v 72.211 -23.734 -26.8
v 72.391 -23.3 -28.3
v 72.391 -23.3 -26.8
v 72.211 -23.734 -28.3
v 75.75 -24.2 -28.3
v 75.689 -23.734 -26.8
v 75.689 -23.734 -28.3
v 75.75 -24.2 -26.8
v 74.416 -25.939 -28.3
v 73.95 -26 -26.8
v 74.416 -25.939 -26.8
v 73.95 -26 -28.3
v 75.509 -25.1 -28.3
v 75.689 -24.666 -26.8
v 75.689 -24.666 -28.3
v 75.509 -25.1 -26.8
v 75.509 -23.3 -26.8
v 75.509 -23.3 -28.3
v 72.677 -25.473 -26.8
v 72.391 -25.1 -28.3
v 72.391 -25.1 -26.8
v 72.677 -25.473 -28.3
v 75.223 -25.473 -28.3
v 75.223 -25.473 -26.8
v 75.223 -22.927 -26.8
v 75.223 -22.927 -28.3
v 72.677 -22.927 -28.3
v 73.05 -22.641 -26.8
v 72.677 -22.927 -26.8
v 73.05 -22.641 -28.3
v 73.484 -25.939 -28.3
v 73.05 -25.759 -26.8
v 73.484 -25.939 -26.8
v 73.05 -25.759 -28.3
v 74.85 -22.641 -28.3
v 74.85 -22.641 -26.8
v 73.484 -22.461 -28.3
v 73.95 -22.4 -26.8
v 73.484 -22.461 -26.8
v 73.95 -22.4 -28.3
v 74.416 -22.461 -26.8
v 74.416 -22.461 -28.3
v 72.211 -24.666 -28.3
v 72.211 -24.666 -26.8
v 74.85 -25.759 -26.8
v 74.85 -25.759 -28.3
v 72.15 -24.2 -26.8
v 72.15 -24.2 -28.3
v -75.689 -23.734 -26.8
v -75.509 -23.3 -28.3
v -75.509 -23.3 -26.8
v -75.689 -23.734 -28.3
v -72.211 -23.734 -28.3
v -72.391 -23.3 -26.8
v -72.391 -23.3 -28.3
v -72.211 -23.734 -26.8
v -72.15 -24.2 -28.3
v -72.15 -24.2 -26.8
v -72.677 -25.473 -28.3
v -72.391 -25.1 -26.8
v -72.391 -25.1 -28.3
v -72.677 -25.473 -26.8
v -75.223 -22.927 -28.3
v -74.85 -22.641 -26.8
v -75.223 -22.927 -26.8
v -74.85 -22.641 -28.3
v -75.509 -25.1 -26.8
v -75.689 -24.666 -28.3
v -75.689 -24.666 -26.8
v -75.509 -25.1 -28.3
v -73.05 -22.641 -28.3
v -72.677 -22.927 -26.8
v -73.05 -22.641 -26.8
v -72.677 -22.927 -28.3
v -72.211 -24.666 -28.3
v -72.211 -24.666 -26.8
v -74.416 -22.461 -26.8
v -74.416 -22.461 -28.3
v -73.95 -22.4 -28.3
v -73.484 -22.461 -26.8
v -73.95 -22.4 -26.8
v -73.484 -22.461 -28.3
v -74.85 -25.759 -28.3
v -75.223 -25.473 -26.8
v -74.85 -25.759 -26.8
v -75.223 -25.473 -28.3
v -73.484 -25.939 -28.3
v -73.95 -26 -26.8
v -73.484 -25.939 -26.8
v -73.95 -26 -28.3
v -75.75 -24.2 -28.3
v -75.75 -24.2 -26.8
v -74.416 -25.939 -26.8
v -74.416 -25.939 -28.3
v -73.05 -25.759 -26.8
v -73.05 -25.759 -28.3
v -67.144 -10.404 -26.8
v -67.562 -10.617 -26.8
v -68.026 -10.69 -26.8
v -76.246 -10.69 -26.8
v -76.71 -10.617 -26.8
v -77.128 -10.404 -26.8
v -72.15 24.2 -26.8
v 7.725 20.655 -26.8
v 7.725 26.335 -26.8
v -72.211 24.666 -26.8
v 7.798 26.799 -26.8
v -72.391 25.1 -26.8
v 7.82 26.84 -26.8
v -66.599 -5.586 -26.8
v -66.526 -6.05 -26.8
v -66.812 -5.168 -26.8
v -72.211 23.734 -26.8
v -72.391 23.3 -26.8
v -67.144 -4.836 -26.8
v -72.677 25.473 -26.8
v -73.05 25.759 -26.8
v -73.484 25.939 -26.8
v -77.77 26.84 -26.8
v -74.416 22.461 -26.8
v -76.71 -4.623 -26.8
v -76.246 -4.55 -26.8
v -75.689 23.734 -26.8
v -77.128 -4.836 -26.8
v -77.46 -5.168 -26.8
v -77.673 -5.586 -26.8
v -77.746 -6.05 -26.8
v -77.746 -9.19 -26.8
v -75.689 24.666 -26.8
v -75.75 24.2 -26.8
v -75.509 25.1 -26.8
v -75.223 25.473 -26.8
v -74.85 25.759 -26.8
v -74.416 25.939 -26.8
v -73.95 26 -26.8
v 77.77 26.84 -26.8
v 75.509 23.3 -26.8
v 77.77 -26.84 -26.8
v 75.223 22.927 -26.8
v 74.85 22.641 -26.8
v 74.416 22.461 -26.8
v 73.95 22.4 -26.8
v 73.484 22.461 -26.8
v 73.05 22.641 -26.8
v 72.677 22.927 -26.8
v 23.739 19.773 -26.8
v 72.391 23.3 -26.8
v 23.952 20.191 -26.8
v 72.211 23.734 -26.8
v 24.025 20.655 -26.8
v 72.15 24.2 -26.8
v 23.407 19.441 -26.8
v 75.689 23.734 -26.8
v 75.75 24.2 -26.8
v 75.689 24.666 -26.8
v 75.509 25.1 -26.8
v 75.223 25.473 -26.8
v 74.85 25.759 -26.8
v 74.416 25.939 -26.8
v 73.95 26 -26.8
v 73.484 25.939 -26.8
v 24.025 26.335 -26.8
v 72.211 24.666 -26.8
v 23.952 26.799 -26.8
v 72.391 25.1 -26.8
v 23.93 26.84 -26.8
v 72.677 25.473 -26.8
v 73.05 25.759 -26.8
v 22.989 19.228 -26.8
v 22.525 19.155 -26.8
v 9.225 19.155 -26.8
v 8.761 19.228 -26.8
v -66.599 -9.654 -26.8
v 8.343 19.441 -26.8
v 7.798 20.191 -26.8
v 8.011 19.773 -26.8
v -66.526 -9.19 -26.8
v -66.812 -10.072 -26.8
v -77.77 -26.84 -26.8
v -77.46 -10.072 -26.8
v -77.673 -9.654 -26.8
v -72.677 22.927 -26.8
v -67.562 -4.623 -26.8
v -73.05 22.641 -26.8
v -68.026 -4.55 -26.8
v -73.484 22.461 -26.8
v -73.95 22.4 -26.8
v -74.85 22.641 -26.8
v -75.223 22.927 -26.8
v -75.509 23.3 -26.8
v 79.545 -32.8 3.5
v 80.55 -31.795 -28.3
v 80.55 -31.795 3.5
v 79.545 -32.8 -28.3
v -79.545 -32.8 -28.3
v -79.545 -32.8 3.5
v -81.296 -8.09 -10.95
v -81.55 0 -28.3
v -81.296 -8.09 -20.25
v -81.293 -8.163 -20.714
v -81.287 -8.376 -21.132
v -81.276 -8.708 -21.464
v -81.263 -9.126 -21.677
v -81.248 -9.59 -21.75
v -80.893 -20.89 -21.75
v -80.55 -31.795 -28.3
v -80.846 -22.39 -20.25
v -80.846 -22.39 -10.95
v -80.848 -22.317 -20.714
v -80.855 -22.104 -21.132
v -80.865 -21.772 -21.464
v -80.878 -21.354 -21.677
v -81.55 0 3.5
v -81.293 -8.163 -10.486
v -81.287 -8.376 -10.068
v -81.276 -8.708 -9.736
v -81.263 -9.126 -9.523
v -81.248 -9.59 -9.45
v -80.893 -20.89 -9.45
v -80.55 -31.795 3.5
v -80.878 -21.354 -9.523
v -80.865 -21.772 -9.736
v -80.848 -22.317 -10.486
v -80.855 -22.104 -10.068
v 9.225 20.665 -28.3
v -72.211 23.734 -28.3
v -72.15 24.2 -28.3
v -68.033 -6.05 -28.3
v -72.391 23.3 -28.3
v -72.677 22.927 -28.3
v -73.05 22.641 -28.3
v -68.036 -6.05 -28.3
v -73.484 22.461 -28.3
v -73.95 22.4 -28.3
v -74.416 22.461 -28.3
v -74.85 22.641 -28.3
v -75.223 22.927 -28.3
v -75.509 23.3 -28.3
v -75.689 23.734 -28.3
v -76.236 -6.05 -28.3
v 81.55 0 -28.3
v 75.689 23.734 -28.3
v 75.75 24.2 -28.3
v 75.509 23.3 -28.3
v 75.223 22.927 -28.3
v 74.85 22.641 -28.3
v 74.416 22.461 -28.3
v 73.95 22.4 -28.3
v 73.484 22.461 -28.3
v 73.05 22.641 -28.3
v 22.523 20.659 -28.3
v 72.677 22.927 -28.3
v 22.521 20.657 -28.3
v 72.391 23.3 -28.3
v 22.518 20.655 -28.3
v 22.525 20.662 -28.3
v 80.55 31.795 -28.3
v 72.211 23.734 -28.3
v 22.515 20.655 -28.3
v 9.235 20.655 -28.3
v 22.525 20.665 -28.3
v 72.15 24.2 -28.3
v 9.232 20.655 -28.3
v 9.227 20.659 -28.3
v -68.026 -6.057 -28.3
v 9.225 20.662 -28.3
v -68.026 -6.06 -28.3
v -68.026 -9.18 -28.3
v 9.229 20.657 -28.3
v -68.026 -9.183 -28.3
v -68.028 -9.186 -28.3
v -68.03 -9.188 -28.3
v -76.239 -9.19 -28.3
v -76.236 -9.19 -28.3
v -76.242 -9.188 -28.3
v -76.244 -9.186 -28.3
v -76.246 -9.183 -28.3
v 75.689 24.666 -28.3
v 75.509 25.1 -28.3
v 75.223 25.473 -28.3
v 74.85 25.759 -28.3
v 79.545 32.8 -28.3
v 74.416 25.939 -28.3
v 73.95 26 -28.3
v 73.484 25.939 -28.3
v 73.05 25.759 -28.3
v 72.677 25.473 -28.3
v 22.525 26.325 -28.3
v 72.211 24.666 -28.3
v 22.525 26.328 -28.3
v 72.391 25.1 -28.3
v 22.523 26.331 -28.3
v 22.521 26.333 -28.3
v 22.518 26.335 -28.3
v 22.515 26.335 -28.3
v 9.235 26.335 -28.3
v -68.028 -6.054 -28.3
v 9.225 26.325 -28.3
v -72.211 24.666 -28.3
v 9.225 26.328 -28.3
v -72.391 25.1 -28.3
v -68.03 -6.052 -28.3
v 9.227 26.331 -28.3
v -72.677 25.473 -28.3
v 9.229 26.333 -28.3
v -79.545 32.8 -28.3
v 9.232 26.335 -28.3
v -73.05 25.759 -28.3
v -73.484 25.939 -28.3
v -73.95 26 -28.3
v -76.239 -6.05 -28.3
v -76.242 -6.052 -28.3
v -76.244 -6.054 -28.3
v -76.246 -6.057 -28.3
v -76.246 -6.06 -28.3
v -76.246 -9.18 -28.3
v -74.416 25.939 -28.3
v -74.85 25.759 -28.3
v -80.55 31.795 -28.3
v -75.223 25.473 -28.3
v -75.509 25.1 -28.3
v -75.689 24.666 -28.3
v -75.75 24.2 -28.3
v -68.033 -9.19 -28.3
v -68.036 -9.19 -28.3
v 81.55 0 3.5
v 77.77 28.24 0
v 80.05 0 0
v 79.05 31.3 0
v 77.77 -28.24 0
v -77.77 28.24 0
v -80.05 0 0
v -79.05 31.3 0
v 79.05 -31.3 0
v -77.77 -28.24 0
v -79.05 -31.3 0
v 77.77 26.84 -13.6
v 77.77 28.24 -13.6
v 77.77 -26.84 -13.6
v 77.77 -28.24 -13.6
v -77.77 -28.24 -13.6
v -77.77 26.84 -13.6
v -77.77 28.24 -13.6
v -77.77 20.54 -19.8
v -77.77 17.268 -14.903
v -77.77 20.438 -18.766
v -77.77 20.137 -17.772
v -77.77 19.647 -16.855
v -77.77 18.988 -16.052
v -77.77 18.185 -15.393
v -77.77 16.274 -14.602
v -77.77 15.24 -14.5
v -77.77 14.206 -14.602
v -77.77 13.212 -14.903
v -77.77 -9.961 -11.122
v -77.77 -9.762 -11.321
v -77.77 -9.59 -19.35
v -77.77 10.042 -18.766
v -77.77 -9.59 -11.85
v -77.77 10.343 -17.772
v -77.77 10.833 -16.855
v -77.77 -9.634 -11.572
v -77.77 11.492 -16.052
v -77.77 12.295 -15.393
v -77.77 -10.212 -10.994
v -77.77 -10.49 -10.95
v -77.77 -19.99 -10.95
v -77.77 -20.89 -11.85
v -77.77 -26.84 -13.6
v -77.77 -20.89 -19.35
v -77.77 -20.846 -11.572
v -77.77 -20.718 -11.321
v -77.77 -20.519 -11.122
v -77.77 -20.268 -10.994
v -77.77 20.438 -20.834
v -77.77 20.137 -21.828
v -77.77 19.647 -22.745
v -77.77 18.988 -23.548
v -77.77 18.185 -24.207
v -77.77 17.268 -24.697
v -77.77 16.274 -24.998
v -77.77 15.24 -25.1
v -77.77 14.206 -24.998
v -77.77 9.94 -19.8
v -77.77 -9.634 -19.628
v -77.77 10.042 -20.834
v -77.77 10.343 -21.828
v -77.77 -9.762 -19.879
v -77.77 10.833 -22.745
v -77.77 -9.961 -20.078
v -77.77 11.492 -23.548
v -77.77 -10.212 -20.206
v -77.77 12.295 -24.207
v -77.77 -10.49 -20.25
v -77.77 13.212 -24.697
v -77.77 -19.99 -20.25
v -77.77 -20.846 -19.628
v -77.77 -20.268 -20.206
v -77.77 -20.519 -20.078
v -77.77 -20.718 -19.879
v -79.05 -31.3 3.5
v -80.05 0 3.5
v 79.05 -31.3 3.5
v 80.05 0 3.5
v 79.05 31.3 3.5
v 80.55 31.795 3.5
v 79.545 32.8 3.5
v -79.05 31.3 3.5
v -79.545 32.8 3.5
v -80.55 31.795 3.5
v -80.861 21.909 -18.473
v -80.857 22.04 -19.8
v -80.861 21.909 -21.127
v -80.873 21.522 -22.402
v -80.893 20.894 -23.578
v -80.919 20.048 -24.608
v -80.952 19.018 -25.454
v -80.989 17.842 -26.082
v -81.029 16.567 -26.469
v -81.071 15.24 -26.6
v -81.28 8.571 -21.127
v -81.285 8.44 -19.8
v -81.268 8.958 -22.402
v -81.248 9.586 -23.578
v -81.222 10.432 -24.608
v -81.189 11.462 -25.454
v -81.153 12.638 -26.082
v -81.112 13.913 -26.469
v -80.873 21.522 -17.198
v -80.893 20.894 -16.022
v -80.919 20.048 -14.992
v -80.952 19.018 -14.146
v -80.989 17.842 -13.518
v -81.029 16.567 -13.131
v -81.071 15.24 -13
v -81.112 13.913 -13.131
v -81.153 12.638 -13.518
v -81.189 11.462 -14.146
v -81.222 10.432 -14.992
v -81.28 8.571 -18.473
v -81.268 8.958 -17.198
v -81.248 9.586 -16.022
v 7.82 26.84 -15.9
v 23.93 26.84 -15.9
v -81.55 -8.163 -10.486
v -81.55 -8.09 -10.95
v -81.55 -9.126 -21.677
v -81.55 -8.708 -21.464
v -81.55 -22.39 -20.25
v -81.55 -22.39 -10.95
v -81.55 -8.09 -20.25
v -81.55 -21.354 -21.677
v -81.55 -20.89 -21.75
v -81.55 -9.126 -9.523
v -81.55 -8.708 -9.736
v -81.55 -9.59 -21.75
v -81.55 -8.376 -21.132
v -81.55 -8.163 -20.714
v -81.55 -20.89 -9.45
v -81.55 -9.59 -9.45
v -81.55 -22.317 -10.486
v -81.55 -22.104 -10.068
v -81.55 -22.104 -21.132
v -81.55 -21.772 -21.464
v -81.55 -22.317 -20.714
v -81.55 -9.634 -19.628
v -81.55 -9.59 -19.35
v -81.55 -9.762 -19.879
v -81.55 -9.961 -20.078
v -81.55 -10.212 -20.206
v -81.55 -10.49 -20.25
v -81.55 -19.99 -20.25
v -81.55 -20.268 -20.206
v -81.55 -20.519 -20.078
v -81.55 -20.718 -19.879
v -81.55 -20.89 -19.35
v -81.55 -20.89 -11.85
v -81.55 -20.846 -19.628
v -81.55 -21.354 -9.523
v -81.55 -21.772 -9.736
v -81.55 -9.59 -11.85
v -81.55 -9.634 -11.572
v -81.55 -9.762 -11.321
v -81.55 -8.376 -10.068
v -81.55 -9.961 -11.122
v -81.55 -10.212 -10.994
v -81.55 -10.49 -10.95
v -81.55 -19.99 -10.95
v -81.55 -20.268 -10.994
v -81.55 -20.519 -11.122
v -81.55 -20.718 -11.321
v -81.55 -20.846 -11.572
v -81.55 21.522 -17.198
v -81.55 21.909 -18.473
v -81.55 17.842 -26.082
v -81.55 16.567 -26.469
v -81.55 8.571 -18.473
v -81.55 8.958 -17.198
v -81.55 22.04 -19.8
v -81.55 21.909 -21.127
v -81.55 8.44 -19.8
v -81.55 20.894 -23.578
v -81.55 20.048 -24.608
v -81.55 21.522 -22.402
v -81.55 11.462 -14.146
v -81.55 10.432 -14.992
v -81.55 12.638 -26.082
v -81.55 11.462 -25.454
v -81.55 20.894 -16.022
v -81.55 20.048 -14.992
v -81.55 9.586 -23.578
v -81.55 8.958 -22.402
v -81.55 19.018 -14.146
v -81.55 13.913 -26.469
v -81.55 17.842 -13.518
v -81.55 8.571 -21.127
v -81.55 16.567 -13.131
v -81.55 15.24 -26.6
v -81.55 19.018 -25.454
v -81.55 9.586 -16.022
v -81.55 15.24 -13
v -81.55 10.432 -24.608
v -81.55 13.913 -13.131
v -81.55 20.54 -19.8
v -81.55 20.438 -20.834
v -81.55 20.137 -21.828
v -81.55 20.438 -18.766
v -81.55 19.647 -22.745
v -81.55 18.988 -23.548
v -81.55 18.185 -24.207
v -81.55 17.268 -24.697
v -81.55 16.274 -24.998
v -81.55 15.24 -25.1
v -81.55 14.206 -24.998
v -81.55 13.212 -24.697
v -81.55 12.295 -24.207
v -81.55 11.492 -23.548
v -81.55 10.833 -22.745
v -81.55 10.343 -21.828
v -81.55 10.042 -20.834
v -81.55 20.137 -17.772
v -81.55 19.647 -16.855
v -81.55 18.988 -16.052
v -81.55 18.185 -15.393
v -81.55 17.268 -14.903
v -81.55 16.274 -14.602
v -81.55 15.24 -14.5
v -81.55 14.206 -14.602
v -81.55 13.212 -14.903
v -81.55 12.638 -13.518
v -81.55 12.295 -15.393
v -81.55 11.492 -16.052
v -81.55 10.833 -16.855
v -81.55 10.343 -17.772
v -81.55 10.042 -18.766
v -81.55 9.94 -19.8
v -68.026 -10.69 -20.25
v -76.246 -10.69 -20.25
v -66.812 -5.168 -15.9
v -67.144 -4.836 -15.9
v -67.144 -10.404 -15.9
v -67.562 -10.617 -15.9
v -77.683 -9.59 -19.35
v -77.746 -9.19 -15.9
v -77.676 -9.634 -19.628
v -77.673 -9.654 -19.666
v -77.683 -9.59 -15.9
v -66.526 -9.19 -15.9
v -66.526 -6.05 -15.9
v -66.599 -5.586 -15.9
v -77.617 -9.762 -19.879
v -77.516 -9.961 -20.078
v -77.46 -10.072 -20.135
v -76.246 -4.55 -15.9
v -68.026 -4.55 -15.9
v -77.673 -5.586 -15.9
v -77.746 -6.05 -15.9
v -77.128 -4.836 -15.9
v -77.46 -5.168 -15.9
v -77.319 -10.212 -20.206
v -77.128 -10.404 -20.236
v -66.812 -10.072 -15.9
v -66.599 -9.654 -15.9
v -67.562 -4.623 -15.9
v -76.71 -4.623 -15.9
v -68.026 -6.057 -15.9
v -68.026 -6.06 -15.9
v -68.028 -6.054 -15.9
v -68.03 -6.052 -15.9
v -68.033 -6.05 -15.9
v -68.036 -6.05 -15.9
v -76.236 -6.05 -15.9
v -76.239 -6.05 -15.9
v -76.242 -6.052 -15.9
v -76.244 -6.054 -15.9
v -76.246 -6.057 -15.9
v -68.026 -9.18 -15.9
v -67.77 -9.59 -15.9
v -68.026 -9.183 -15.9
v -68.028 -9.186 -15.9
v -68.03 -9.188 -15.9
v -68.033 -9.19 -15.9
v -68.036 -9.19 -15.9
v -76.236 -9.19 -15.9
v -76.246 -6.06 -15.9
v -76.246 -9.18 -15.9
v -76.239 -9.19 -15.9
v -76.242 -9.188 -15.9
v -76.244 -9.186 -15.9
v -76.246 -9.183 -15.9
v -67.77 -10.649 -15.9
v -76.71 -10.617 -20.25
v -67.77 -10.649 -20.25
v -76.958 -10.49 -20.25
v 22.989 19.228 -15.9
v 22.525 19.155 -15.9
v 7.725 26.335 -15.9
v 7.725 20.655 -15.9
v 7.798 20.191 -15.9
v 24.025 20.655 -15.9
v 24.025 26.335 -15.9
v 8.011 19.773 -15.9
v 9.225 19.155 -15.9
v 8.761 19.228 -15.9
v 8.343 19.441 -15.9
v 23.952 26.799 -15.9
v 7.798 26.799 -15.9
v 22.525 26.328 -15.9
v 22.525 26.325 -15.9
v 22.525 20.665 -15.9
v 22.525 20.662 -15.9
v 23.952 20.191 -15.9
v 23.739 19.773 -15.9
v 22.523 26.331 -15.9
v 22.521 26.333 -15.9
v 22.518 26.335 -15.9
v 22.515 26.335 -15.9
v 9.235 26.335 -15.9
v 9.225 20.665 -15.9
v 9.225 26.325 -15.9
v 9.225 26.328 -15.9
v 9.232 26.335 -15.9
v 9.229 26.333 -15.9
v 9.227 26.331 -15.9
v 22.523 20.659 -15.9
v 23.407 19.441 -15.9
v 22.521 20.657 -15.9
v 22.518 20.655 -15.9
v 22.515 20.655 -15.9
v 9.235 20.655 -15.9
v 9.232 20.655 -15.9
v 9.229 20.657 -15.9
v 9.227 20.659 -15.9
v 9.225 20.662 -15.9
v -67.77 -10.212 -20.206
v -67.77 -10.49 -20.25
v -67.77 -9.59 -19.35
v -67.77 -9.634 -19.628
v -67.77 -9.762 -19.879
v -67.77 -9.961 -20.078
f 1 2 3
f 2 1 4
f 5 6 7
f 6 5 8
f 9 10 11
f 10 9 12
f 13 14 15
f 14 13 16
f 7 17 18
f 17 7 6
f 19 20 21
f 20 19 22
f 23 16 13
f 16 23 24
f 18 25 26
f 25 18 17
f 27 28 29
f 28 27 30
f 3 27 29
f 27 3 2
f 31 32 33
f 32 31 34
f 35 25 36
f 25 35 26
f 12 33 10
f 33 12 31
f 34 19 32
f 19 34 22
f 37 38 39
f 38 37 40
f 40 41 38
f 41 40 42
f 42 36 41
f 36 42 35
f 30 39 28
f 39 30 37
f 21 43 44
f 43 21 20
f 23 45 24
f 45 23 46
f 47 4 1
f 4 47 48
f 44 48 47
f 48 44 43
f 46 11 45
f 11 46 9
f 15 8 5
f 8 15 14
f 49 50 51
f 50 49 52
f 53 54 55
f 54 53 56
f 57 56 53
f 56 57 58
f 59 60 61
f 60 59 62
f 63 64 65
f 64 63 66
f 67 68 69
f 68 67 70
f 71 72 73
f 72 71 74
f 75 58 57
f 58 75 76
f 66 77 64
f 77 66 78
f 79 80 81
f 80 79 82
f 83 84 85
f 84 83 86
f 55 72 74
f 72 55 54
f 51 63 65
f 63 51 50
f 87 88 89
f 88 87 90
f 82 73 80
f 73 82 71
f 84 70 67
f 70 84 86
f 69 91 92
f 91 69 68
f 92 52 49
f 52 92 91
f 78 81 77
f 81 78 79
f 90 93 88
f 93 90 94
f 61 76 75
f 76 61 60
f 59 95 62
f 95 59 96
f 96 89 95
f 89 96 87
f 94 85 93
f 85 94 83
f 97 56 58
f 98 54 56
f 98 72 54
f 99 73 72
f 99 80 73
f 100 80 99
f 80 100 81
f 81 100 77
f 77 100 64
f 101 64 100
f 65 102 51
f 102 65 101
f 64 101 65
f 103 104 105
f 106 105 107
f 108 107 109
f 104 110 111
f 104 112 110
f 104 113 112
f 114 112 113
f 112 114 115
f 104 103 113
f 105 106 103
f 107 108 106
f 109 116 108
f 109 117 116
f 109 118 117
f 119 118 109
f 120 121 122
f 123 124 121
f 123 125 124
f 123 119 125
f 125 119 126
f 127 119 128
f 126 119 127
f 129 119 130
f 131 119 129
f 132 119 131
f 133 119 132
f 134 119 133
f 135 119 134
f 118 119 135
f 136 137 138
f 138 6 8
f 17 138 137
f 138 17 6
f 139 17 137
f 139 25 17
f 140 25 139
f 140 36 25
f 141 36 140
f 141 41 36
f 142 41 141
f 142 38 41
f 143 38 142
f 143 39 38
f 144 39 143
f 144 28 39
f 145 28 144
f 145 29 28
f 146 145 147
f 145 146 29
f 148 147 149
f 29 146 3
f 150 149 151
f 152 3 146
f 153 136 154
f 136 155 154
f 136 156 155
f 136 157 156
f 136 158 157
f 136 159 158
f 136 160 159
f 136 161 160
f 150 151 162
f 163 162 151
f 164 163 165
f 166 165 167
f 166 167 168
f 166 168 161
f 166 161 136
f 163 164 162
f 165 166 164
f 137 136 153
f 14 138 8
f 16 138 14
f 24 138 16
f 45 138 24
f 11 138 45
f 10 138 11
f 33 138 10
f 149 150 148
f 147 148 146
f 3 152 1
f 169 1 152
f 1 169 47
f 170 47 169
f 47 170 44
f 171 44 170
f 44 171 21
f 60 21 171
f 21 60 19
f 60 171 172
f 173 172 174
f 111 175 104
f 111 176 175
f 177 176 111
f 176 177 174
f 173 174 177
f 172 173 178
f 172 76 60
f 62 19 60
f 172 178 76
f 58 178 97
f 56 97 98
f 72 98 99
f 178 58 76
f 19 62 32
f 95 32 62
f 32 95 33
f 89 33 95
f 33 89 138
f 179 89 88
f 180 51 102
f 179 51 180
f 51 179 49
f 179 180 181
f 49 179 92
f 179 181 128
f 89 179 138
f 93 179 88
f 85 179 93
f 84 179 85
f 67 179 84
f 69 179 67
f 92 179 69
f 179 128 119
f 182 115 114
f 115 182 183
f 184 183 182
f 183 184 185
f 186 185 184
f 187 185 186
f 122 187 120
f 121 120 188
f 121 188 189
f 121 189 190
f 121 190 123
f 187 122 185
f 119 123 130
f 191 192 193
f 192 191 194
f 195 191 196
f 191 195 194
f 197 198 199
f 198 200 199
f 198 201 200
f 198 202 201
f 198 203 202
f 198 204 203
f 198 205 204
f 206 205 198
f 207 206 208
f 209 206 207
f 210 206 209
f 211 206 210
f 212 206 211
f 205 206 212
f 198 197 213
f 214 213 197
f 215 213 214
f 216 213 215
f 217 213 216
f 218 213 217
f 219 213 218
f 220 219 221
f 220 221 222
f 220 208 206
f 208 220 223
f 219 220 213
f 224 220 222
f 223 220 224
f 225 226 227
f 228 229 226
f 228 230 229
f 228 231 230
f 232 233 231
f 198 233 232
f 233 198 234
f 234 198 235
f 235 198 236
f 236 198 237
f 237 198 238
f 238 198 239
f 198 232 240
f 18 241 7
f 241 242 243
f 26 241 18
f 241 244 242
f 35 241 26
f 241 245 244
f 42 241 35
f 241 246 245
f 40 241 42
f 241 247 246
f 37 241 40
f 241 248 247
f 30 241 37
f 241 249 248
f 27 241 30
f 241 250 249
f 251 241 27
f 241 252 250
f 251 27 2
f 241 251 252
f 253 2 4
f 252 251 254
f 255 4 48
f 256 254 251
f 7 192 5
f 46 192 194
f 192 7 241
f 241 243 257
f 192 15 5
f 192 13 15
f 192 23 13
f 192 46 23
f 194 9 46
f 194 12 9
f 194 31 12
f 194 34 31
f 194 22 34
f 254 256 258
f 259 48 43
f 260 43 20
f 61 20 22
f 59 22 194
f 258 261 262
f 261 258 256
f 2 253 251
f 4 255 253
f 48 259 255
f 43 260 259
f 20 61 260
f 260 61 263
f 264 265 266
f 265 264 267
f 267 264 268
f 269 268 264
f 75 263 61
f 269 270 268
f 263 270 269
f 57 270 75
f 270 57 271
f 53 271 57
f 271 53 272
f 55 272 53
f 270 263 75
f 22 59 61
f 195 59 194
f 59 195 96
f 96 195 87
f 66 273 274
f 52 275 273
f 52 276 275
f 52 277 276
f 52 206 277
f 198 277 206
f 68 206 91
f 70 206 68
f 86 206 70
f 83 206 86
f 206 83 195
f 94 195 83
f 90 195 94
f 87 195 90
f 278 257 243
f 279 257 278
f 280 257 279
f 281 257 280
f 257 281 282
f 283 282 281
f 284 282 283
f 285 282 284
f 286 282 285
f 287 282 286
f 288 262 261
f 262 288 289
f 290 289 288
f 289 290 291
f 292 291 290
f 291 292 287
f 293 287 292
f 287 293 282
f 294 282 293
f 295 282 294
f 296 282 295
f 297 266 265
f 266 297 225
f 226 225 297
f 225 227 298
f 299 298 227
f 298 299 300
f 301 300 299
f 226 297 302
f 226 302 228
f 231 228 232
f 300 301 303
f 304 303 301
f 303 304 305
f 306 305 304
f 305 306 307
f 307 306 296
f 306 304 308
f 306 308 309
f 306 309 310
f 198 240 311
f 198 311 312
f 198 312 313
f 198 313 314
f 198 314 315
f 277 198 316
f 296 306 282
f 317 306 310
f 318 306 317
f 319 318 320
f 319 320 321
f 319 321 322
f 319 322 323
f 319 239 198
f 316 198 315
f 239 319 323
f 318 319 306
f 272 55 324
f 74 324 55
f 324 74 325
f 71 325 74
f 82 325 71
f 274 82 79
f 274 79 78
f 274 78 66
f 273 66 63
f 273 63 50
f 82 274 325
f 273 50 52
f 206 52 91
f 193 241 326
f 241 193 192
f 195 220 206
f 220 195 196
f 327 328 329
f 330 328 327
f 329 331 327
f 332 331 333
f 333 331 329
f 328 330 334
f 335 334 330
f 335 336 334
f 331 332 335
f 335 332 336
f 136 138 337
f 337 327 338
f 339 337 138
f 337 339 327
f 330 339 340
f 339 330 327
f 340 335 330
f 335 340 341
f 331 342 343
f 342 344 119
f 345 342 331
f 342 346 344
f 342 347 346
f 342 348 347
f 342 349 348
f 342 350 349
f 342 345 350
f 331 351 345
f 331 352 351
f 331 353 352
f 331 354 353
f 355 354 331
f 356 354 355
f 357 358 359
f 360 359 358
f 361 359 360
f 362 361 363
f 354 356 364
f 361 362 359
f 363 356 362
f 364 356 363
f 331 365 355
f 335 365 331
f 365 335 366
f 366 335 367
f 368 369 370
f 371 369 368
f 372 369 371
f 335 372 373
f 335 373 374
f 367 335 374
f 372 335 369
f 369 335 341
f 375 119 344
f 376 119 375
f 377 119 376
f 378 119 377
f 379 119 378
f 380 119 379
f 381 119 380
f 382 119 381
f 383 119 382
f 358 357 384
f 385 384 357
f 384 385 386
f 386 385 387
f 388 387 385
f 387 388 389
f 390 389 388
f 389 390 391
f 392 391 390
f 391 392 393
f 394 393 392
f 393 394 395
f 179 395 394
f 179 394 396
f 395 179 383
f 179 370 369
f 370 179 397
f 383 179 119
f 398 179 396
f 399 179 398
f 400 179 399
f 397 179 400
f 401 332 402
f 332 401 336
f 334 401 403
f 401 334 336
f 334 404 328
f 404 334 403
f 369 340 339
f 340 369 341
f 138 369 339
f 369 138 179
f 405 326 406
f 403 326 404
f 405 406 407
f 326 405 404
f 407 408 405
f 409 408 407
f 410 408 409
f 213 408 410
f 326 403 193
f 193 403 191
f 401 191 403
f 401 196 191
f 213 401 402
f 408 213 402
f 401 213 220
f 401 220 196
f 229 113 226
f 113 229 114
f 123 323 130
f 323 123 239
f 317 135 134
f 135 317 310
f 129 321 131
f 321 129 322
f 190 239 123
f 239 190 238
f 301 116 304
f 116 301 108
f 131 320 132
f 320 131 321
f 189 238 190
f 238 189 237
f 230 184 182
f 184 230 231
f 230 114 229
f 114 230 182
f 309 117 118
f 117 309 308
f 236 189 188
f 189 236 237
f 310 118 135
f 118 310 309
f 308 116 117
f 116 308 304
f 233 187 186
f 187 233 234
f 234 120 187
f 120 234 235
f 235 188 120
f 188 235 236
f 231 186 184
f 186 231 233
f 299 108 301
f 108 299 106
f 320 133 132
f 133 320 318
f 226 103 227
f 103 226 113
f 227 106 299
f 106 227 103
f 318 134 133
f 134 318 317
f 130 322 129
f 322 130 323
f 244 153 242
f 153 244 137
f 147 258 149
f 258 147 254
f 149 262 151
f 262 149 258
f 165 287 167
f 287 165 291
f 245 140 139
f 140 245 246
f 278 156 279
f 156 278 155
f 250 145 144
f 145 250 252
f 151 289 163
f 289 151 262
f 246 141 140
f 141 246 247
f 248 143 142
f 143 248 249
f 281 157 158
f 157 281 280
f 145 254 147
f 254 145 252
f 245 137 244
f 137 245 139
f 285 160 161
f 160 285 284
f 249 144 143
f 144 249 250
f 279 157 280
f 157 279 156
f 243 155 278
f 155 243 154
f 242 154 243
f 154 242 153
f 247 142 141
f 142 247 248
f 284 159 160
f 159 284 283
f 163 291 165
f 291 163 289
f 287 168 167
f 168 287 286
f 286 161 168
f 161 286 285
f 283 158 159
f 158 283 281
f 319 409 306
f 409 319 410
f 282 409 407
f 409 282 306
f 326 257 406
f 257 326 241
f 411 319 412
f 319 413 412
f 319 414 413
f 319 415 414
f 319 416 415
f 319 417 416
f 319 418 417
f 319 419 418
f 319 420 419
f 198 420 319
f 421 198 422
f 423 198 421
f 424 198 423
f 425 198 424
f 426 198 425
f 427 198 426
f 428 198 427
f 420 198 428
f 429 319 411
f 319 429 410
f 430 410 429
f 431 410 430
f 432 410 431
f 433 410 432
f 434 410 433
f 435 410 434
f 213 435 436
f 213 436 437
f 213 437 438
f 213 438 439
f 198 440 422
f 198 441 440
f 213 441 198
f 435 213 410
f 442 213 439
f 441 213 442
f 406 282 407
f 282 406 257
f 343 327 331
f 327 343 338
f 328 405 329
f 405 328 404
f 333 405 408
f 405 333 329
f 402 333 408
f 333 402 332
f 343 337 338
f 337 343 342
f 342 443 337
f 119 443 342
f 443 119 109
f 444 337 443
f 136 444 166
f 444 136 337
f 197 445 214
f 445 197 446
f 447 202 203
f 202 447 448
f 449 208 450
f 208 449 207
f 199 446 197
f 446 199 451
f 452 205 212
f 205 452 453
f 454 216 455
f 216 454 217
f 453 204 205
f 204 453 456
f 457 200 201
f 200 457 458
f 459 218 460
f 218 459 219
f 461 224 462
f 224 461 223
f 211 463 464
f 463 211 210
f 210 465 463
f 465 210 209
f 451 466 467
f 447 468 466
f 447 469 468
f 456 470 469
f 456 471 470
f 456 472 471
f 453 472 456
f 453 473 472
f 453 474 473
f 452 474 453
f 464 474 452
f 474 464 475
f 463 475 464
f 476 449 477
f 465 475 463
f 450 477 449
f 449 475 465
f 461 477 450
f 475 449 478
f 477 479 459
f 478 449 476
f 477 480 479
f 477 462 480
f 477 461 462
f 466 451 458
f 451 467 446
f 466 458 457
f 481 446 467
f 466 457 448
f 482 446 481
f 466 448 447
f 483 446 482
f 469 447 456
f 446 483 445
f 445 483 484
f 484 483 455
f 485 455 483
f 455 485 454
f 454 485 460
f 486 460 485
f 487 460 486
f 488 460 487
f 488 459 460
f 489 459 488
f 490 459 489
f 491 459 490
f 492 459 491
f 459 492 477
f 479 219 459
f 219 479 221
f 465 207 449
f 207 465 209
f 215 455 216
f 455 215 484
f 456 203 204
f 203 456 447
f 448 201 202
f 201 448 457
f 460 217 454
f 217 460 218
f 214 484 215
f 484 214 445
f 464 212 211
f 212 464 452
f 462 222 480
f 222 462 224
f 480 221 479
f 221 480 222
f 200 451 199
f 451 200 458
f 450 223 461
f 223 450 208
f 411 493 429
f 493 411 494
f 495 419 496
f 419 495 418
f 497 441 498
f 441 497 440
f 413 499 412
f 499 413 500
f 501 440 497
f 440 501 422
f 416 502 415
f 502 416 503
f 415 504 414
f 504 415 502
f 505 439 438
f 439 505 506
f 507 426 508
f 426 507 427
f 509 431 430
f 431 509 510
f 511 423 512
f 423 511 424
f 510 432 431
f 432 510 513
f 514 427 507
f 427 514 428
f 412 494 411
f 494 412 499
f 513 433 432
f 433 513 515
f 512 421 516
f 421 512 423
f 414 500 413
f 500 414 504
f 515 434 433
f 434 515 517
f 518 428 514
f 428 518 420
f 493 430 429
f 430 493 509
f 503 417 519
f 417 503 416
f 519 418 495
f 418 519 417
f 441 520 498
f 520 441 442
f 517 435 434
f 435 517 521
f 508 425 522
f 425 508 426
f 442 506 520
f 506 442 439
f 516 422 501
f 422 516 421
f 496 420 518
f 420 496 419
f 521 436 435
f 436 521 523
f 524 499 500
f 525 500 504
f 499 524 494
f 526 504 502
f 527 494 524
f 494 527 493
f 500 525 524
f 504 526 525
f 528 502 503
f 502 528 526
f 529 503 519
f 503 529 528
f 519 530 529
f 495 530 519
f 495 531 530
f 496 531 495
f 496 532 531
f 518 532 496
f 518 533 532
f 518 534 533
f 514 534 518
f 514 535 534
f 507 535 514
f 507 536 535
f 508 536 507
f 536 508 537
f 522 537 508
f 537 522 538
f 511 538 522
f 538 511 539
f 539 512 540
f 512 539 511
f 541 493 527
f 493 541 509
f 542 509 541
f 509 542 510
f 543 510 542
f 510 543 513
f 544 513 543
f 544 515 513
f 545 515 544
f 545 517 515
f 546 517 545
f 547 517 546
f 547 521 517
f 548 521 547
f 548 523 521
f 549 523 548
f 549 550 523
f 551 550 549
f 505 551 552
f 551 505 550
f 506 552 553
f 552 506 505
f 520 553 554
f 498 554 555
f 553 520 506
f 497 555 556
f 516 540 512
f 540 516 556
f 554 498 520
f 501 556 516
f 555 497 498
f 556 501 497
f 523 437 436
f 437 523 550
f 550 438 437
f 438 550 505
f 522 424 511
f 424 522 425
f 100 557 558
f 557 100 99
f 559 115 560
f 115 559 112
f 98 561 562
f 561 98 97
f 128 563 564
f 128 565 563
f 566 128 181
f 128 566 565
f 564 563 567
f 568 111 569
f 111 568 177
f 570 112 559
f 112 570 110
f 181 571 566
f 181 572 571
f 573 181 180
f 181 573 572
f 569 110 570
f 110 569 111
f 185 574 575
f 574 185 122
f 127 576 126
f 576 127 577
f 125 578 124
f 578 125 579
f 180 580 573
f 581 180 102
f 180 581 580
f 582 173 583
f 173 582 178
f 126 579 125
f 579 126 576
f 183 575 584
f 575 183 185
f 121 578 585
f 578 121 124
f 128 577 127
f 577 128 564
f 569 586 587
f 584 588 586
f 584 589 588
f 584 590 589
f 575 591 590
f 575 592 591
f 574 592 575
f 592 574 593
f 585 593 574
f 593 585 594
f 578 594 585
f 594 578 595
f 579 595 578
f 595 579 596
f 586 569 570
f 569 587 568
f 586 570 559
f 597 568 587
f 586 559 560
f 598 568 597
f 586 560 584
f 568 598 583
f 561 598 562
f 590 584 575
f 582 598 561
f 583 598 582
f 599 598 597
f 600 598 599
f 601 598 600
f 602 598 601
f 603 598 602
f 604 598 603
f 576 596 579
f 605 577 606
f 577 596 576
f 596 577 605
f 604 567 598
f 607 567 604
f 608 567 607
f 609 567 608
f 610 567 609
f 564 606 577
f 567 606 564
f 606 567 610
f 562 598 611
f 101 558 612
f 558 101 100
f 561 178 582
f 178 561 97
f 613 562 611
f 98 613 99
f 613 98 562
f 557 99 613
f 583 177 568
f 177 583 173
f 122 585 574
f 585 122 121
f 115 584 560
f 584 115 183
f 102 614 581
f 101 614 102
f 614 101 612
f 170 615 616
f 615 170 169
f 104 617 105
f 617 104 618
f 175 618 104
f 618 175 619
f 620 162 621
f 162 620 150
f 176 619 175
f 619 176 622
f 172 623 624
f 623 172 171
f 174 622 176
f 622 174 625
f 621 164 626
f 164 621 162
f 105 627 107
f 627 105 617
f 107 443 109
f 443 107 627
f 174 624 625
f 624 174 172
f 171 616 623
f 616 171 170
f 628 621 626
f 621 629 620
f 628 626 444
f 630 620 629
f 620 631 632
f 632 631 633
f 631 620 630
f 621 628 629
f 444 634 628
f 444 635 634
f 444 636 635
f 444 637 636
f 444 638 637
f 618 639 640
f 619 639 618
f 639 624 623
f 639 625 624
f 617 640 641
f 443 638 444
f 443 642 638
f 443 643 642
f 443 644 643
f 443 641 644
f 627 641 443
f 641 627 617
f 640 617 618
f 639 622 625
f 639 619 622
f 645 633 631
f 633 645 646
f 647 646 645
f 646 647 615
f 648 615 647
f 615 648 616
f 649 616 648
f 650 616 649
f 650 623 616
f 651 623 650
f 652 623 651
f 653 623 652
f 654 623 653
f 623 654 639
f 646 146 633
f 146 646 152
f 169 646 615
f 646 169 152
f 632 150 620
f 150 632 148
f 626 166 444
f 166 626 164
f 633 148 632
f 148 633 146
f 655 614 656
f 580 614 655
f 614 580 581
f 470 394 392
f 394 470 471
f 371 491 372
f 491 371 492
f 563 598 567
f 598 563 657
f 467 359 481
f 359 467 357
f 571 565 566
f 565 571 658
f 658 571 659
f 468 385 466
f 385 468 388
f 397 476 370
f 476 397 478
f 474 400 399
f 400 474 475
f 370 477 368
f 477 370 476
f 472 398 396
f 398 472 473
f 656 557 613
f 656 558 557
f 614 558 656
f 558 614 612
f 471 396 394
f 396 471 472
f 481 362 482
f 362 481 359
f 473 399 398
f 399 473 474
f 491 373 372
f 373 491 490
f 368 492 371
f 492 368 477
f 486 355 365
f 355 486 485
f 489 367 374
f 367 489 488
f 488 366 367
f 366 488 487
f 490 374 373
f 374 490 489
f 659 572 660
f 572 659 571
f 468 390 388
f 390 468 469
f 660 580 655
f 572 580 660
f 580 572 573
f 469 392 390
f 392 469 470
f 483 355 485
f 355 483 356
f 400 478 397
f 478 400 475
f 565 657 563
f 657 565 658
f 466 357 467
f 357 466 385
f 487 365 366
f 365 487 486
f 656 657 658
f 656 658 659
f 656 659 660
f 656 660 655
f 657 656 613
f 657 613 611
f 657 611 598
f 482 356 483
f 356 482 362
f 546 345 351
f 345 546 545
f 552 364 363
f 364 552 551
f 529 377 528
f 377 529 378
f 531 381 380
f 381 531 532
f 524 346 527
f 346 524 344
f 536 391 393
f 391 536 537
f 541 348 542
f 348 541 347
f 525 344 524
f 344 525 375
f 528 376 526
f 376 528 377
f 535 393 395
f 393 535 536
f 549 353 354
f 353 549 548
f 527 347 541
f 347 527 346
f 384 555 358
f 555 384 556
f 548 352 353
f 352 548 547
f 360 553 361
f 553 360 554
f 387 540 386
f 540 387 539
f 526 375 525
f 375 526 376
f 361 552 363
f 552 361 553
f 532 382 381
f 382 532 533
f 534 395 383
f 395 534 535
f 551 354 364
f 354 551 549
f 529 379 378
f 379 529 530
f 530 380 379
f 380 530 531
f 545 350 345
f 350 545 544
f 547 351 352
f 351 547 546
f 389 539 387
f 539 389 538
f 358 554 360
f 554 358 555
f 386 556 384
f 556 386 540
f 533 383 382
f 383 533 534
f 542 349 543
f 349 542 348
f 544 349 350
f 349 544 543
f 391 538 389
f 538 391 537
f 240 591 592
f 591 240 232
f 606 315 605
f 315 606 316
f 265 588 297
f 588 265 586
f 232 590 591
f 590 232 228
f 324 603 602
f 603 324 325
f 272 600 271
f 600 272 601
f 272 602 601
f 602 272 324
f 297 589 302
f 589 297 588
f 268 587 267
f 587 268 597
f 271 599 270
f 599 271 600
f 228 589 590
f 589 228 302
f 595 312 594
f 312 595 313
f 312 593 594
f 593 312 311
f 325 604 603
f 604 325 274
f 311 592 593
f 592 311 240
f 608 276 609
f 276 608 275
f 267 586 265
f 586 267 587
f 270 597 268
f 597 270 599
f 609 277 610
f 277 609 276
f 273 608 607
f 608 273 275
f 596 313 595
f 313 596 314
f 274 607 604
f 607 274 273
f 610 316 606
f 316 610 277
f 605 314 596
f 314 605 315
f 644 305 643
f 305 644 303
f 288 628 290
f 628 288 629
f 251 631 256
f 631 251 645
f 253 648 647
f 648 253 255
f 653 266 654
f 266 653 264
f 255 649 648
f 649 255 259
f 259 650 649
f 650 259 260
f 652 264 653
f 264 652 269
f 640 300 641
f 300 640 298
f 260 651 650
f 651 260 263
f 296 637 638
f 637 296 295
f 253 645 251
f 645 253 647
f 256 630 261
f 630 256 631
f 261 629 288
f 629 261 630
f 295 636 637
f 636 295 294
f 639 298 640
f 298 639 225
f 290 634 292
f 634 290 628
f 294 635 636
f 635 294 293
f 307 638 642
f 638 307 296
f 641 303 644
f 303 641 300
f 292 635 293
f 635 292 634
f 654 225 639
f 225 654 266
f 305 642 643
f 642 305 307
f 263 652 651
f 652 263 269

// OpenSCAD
// case for FG085 signal generator
//
// design origin is center inside of front panel

part = "shell";  // [ shell, demo ]
with_tubes = 0; // [ 1:true, 0:false ]
with_u5p = 0; // [ 1:true, 0:false ]
with_u6p = 1; // [ 1:true, 0:false ]
with_pwm = 1; // [ 1:true, 0:false ]
with_usb = 1; // [ 1:true, 0:false ]

/* [Hidden] */
function in2mm(a) = a * 25.4;

panel_width = 157.5; // at base BUG: accurate?
panel_height = 62.0; 
panel_wall = 2.0;
panel_delta_w = 1.0; // extra width at middle of sides
pcb_thickness = 1.6;
pcb_width = in2mm(6.100); 
pcb_height = in2mm(2.200); 
spacer_front = 12.0; // the spacer with the threads, placed behind front panel and pcb
spacer_rear = 13.2; // placed on rear of pcb
panel_dist = spacer_front + pcb_thickness + spacer_rear; // between panels
screw_thread = 3.0;
nut_af = 4.65; // across flats
nut_dia = 5.3; // to clear
screw_dx = 144.3 + 3.6; // mounting hole distances
screw_dy = 44.8 + 3.6;

power_dia = 10.0; // dia of plug body  
power_pos_z = pcb_height/2 - in2mm(0.500); // offset from middle of PCB
power_pos_y = 6.2; // height from PCB surface
usb_width = 11.0; // plug body
usb_height = 9.0; // plug body
usb_pos_z = -(pcb_height/2 - in2mm(0.500)); // offset from middle of PCB
usb_pos_y = 2.0; // height from PCB surface

pwm_pos_z = -(pcb_height/2 - in2mm(0.800)); // offset from middle of PCB
pwm_pos_x = -(pcb_width/2 - in2mm(0.210)); 
u6p_pos_z = pcb_height/2 - in2mm(0.075) - in2mm(0.100);
u6p_pos_x = pcb_width/2 - in2mm(2.675) + in2mm(0.500)/2;
u5p_pos_z = u6p_pos_z;
u5p_pos_x = pcb_width/2 - in2mm(3.500) + in2mm(0.500)/2;

// tunable
support = 0.4; // needs to be wider than nozzle
wall = 1.5;
chamfer = wall*0.67;
tol = 0.3;
d = 0.01;

if (part == "demo") {
    if (false) color([0, 0.5, 0, 0.3]) {
        panel(0); // front
        translate([0, panel_wall+panel_dist, 0]) panel(0); // rear
    }
    shell();
}  

if (part == "shell") {
    rotate([-90, 0, 0]) shell();
}  

module shell() {
    module power(is_tube) {
        translate([-(pcb_width/2+tol)+(is_tube?0:10), spacer_front + pcb_thickness + power_pos_y, power_pos_z]) rotate([0, -90, 0]) 
            cylinder(r=power_dia/2 + tol + (is_tube?wall : 0), h=panel_delta_w+wall+(panel_width-pcb_width)/2+(is_tube?0:10+d), $fn=32);
    }
    module usb(is_tube) {
        if (with_usb) translate([-(pcb_width/2+tol)+(is_tube?0:10), spacer_front + pcb_thickness + usb_pos_y, usb_pos_z]) rotate([0, -90, 0]) 
            cr_cube(usb_width+tol+(is_tube?2*wall:0), 
                    usb_height+tol+(is_tube?2*wall : 0), 
                    panel_delta_w+wall+(panel_width-pcb_width)/2+(is_tube?0:10+d), 
                    (is_tube?wall:wall*0.6));
    }
    module rearconn(is_tube, dx, dz, nx, nz) {
        translate([dx, panel_dist + wall + (is_tube?0:d), dz]) rotate([90, 0, 0]) 
            cr_cube(nx*in2mm(0.1)+2*tol+(is_tube?2*wall:0), 
                    nz*in2mm(0.1)+2*tol+(is_tube?2*wall:0), 
                    wall+spacer_rear-2.0-tol+(is_tube?0:d+d), 
                    (is_tube?wall:d));
    }
    module conns(is_tube) {
        usb(is_tube);
        power(is_tube);
        if (with_pwm) rearconn(is_tube, pwm_pos_x, pwm_pos_z, 3, 1);
        if (with_u5p) rearconn(is_tube, u5p_pos_x, u5p_pos_z, 5, 2);
        if (with_u6p) rearconn(is_tube, u6p_pos_x, u6p_pos_z, 5, 2);
    }

    difference () {
        union ( ){
            halfshell();
            rotate([0, 180, 0]) halfshell();
            conns(true);
        }
        union ( ){
            conns(false);
        }
    } 
}

module halfshell() { // half shell

    // inner frame around PCB
    translate([0, panel_dist, 0]) rotate([90, 0, 0]) {
        linear_extrude(panel_dist) polygon([       
        [-(pcb_width/2+tol), 0],
        [-(pcb_width/2+tol), -(pcb_height/2+tol)],
        [pcb_width/2+tol, -(pcb_height/2+tol)], 
        [pcb_width/2+tol, 0],
        [panel_width/2+panel_delta_w+tol, 0],
        [panel_width/2+tol, -(panel_height/2+tol)],
        [-(panel_width/2+tol), -(panel_height/2+tol)],        
        [-(panel_width/2+panel_delta_w+tol), 0]]);
    }
    // support under pcb, 1.1 mm thick
    translate([0, panel_dist, 0]) rotate([90, 0, 0]) {
        linear_extrude(spacer_rear) polygon([       
            [-panel_width/2-tol, -pcb_height/2 + 1.1],
            [-panel_width/2-tol, -panel_height/2+wall],
            [panel_width/2+tol, -panel_height/2+wall],
            [panel_width/2+tol, -pcb_height/2 + 1.1]]);
    }
    // side walls
    translate([0, panel_dist+wall, 0]) rotate([90, 0, 0]) {
       linear_extrude(2*wall+panel_wall+panel_dist) polygon([       
       [-panel_width/2-panel_delta_w-tol, 0],
       [-panel_width/2-tol, -(panel_height/2+tol)],
       [panel_width/2+tol, -(panel_height/2+tol)], 
       [panel_width/2+panel_delta_w+tol, 0],
       [panel_width/2+panel_delta_w+tol+wall, 0],
       [panel_width/2+tol+wall, -panel_height/2-tol-wall+chamfer],
       [panel_width/2+tol+wall-chamfer, -panel_height/2-tol-wall],
       [-panel_width/2-tol-wall+chamfer, -panel_height/2-tol-wall],  
       [-panel_width/2-tol-wall, -panel_height/2-tol-wall+chamfer],      
       [-panel_width/2-panel_delta_w-tol-wall, 0]]);
    }
    // bottom
    difference () {
        translate([0, panel_dist+wall, 0]) rotate([90, 0, 0]) {
           linear_extrude(wall) polygon([       
           [panel_width/2+panel_delta_w+tol+wall, 0],
           [panel_width/2+tol+wall, -panel_height/2-tol-wall+chamfer],
           [panel_width/2+tol+wall-chamfer, -panel_height/2-tol-wall],
           [-panel_width/2-tol-wall+chamfer, -panel_height/2-tol-wall],  
           [-panel_width/2-tol-wall, -panel_height/2-tol-wall+chamfer],      
           [-panel_width/2-panel_delta_w-tol-wall, 0]]);
        }
        translate([0, panel_dist+wall+d, 0]) for (dx = [1, -1]) rotate([90, 0, 0])         translate([dx*screw_dx/2, -screw_dy/2, 0]) cylinder(r=screw_thread/2+tol, h=wall+2*d, $fn=24);
   }
        

   // tubes for screws
   dz = -panel_dist; 
   if (with_tubes) for (dx = [1, -1]) rotate([90, 0, 0]) translate([dx*screw_dx/2, -screw_dy/2, dz]) {
       difference () {
           union () {
               cylinder(r=nut_dia/2+tol/2+wall, h=spacer_rear, $fn=24);
               translate([0, -(panel_height-screw_dy)/4, 0]) c_cube(nut_dia+tol+2*wall, (panel_height-screw_dy)/2, spacer_rear);
               translate([dx*(panel_width-screw_dx)/4, 0, 0]) c_cube((panel_width-screw_dx)/2, nut_dia+tol+2*wall, spacer_rear);
           }
           rotate([0, 0, 30]) translate([0, 0, -d]) cylinder(r=nut_dia/2 + tol/2, h=spacer_rear+2*d, $fn=66);
       }
   }
 
} 
    
module panel(air)
{
   difference() {
        rotate([90, 0, 0]) {
            translate([0, 0, -air]) linear_extrude(panel_wall+2*air) polygon([
            [-panel_width/2-panel_delta_w-air, 0], 
            [-panel_width/2-air, panel_height/2+air], 
            [panel_width/2+air, panel_height/2+air],  
            [panel_width/2+panel_delta_w+air, 0], 
            [panel_width/2+air, -panel_height/2-air],
            [-panel_width/2-air, -panel_height/2-air]]);
       }
       union() {
           for (dx = [1, -1]) for (dy = [1, -1]) rotate([90, 0, 0]) translate([dx*screw_dx/2, dy*screw_dy/2, -d]) cylinder(r=3.0/2, h=2*d+panel_wall, $fn=12);
       }
   }
}    
    
    module c_cube(x, y, z) {
	translate([-x/2, -y/2, 0]) cube([x, y, z]);
}

module cr_cube(x, y, z, r) {
	hull() {
		for (dx=[-1,1]) for (dy=[-1,1]) translate([dx*(x/2-r), dy*(y/2-r), 0]) cylinder(r=r, h=z, $fn=20);
	}
}

module cr2_cube(x, y, z, r1, r2) {
	hull() {
		for (dx=[-1,1]) for (dy=[-1,1]) translate([dx*(x/2-r1), dy*(y/2-r1), 0]) cylinder(r1=r1, r2=r2, h=z, $fn=20);
	}
}
